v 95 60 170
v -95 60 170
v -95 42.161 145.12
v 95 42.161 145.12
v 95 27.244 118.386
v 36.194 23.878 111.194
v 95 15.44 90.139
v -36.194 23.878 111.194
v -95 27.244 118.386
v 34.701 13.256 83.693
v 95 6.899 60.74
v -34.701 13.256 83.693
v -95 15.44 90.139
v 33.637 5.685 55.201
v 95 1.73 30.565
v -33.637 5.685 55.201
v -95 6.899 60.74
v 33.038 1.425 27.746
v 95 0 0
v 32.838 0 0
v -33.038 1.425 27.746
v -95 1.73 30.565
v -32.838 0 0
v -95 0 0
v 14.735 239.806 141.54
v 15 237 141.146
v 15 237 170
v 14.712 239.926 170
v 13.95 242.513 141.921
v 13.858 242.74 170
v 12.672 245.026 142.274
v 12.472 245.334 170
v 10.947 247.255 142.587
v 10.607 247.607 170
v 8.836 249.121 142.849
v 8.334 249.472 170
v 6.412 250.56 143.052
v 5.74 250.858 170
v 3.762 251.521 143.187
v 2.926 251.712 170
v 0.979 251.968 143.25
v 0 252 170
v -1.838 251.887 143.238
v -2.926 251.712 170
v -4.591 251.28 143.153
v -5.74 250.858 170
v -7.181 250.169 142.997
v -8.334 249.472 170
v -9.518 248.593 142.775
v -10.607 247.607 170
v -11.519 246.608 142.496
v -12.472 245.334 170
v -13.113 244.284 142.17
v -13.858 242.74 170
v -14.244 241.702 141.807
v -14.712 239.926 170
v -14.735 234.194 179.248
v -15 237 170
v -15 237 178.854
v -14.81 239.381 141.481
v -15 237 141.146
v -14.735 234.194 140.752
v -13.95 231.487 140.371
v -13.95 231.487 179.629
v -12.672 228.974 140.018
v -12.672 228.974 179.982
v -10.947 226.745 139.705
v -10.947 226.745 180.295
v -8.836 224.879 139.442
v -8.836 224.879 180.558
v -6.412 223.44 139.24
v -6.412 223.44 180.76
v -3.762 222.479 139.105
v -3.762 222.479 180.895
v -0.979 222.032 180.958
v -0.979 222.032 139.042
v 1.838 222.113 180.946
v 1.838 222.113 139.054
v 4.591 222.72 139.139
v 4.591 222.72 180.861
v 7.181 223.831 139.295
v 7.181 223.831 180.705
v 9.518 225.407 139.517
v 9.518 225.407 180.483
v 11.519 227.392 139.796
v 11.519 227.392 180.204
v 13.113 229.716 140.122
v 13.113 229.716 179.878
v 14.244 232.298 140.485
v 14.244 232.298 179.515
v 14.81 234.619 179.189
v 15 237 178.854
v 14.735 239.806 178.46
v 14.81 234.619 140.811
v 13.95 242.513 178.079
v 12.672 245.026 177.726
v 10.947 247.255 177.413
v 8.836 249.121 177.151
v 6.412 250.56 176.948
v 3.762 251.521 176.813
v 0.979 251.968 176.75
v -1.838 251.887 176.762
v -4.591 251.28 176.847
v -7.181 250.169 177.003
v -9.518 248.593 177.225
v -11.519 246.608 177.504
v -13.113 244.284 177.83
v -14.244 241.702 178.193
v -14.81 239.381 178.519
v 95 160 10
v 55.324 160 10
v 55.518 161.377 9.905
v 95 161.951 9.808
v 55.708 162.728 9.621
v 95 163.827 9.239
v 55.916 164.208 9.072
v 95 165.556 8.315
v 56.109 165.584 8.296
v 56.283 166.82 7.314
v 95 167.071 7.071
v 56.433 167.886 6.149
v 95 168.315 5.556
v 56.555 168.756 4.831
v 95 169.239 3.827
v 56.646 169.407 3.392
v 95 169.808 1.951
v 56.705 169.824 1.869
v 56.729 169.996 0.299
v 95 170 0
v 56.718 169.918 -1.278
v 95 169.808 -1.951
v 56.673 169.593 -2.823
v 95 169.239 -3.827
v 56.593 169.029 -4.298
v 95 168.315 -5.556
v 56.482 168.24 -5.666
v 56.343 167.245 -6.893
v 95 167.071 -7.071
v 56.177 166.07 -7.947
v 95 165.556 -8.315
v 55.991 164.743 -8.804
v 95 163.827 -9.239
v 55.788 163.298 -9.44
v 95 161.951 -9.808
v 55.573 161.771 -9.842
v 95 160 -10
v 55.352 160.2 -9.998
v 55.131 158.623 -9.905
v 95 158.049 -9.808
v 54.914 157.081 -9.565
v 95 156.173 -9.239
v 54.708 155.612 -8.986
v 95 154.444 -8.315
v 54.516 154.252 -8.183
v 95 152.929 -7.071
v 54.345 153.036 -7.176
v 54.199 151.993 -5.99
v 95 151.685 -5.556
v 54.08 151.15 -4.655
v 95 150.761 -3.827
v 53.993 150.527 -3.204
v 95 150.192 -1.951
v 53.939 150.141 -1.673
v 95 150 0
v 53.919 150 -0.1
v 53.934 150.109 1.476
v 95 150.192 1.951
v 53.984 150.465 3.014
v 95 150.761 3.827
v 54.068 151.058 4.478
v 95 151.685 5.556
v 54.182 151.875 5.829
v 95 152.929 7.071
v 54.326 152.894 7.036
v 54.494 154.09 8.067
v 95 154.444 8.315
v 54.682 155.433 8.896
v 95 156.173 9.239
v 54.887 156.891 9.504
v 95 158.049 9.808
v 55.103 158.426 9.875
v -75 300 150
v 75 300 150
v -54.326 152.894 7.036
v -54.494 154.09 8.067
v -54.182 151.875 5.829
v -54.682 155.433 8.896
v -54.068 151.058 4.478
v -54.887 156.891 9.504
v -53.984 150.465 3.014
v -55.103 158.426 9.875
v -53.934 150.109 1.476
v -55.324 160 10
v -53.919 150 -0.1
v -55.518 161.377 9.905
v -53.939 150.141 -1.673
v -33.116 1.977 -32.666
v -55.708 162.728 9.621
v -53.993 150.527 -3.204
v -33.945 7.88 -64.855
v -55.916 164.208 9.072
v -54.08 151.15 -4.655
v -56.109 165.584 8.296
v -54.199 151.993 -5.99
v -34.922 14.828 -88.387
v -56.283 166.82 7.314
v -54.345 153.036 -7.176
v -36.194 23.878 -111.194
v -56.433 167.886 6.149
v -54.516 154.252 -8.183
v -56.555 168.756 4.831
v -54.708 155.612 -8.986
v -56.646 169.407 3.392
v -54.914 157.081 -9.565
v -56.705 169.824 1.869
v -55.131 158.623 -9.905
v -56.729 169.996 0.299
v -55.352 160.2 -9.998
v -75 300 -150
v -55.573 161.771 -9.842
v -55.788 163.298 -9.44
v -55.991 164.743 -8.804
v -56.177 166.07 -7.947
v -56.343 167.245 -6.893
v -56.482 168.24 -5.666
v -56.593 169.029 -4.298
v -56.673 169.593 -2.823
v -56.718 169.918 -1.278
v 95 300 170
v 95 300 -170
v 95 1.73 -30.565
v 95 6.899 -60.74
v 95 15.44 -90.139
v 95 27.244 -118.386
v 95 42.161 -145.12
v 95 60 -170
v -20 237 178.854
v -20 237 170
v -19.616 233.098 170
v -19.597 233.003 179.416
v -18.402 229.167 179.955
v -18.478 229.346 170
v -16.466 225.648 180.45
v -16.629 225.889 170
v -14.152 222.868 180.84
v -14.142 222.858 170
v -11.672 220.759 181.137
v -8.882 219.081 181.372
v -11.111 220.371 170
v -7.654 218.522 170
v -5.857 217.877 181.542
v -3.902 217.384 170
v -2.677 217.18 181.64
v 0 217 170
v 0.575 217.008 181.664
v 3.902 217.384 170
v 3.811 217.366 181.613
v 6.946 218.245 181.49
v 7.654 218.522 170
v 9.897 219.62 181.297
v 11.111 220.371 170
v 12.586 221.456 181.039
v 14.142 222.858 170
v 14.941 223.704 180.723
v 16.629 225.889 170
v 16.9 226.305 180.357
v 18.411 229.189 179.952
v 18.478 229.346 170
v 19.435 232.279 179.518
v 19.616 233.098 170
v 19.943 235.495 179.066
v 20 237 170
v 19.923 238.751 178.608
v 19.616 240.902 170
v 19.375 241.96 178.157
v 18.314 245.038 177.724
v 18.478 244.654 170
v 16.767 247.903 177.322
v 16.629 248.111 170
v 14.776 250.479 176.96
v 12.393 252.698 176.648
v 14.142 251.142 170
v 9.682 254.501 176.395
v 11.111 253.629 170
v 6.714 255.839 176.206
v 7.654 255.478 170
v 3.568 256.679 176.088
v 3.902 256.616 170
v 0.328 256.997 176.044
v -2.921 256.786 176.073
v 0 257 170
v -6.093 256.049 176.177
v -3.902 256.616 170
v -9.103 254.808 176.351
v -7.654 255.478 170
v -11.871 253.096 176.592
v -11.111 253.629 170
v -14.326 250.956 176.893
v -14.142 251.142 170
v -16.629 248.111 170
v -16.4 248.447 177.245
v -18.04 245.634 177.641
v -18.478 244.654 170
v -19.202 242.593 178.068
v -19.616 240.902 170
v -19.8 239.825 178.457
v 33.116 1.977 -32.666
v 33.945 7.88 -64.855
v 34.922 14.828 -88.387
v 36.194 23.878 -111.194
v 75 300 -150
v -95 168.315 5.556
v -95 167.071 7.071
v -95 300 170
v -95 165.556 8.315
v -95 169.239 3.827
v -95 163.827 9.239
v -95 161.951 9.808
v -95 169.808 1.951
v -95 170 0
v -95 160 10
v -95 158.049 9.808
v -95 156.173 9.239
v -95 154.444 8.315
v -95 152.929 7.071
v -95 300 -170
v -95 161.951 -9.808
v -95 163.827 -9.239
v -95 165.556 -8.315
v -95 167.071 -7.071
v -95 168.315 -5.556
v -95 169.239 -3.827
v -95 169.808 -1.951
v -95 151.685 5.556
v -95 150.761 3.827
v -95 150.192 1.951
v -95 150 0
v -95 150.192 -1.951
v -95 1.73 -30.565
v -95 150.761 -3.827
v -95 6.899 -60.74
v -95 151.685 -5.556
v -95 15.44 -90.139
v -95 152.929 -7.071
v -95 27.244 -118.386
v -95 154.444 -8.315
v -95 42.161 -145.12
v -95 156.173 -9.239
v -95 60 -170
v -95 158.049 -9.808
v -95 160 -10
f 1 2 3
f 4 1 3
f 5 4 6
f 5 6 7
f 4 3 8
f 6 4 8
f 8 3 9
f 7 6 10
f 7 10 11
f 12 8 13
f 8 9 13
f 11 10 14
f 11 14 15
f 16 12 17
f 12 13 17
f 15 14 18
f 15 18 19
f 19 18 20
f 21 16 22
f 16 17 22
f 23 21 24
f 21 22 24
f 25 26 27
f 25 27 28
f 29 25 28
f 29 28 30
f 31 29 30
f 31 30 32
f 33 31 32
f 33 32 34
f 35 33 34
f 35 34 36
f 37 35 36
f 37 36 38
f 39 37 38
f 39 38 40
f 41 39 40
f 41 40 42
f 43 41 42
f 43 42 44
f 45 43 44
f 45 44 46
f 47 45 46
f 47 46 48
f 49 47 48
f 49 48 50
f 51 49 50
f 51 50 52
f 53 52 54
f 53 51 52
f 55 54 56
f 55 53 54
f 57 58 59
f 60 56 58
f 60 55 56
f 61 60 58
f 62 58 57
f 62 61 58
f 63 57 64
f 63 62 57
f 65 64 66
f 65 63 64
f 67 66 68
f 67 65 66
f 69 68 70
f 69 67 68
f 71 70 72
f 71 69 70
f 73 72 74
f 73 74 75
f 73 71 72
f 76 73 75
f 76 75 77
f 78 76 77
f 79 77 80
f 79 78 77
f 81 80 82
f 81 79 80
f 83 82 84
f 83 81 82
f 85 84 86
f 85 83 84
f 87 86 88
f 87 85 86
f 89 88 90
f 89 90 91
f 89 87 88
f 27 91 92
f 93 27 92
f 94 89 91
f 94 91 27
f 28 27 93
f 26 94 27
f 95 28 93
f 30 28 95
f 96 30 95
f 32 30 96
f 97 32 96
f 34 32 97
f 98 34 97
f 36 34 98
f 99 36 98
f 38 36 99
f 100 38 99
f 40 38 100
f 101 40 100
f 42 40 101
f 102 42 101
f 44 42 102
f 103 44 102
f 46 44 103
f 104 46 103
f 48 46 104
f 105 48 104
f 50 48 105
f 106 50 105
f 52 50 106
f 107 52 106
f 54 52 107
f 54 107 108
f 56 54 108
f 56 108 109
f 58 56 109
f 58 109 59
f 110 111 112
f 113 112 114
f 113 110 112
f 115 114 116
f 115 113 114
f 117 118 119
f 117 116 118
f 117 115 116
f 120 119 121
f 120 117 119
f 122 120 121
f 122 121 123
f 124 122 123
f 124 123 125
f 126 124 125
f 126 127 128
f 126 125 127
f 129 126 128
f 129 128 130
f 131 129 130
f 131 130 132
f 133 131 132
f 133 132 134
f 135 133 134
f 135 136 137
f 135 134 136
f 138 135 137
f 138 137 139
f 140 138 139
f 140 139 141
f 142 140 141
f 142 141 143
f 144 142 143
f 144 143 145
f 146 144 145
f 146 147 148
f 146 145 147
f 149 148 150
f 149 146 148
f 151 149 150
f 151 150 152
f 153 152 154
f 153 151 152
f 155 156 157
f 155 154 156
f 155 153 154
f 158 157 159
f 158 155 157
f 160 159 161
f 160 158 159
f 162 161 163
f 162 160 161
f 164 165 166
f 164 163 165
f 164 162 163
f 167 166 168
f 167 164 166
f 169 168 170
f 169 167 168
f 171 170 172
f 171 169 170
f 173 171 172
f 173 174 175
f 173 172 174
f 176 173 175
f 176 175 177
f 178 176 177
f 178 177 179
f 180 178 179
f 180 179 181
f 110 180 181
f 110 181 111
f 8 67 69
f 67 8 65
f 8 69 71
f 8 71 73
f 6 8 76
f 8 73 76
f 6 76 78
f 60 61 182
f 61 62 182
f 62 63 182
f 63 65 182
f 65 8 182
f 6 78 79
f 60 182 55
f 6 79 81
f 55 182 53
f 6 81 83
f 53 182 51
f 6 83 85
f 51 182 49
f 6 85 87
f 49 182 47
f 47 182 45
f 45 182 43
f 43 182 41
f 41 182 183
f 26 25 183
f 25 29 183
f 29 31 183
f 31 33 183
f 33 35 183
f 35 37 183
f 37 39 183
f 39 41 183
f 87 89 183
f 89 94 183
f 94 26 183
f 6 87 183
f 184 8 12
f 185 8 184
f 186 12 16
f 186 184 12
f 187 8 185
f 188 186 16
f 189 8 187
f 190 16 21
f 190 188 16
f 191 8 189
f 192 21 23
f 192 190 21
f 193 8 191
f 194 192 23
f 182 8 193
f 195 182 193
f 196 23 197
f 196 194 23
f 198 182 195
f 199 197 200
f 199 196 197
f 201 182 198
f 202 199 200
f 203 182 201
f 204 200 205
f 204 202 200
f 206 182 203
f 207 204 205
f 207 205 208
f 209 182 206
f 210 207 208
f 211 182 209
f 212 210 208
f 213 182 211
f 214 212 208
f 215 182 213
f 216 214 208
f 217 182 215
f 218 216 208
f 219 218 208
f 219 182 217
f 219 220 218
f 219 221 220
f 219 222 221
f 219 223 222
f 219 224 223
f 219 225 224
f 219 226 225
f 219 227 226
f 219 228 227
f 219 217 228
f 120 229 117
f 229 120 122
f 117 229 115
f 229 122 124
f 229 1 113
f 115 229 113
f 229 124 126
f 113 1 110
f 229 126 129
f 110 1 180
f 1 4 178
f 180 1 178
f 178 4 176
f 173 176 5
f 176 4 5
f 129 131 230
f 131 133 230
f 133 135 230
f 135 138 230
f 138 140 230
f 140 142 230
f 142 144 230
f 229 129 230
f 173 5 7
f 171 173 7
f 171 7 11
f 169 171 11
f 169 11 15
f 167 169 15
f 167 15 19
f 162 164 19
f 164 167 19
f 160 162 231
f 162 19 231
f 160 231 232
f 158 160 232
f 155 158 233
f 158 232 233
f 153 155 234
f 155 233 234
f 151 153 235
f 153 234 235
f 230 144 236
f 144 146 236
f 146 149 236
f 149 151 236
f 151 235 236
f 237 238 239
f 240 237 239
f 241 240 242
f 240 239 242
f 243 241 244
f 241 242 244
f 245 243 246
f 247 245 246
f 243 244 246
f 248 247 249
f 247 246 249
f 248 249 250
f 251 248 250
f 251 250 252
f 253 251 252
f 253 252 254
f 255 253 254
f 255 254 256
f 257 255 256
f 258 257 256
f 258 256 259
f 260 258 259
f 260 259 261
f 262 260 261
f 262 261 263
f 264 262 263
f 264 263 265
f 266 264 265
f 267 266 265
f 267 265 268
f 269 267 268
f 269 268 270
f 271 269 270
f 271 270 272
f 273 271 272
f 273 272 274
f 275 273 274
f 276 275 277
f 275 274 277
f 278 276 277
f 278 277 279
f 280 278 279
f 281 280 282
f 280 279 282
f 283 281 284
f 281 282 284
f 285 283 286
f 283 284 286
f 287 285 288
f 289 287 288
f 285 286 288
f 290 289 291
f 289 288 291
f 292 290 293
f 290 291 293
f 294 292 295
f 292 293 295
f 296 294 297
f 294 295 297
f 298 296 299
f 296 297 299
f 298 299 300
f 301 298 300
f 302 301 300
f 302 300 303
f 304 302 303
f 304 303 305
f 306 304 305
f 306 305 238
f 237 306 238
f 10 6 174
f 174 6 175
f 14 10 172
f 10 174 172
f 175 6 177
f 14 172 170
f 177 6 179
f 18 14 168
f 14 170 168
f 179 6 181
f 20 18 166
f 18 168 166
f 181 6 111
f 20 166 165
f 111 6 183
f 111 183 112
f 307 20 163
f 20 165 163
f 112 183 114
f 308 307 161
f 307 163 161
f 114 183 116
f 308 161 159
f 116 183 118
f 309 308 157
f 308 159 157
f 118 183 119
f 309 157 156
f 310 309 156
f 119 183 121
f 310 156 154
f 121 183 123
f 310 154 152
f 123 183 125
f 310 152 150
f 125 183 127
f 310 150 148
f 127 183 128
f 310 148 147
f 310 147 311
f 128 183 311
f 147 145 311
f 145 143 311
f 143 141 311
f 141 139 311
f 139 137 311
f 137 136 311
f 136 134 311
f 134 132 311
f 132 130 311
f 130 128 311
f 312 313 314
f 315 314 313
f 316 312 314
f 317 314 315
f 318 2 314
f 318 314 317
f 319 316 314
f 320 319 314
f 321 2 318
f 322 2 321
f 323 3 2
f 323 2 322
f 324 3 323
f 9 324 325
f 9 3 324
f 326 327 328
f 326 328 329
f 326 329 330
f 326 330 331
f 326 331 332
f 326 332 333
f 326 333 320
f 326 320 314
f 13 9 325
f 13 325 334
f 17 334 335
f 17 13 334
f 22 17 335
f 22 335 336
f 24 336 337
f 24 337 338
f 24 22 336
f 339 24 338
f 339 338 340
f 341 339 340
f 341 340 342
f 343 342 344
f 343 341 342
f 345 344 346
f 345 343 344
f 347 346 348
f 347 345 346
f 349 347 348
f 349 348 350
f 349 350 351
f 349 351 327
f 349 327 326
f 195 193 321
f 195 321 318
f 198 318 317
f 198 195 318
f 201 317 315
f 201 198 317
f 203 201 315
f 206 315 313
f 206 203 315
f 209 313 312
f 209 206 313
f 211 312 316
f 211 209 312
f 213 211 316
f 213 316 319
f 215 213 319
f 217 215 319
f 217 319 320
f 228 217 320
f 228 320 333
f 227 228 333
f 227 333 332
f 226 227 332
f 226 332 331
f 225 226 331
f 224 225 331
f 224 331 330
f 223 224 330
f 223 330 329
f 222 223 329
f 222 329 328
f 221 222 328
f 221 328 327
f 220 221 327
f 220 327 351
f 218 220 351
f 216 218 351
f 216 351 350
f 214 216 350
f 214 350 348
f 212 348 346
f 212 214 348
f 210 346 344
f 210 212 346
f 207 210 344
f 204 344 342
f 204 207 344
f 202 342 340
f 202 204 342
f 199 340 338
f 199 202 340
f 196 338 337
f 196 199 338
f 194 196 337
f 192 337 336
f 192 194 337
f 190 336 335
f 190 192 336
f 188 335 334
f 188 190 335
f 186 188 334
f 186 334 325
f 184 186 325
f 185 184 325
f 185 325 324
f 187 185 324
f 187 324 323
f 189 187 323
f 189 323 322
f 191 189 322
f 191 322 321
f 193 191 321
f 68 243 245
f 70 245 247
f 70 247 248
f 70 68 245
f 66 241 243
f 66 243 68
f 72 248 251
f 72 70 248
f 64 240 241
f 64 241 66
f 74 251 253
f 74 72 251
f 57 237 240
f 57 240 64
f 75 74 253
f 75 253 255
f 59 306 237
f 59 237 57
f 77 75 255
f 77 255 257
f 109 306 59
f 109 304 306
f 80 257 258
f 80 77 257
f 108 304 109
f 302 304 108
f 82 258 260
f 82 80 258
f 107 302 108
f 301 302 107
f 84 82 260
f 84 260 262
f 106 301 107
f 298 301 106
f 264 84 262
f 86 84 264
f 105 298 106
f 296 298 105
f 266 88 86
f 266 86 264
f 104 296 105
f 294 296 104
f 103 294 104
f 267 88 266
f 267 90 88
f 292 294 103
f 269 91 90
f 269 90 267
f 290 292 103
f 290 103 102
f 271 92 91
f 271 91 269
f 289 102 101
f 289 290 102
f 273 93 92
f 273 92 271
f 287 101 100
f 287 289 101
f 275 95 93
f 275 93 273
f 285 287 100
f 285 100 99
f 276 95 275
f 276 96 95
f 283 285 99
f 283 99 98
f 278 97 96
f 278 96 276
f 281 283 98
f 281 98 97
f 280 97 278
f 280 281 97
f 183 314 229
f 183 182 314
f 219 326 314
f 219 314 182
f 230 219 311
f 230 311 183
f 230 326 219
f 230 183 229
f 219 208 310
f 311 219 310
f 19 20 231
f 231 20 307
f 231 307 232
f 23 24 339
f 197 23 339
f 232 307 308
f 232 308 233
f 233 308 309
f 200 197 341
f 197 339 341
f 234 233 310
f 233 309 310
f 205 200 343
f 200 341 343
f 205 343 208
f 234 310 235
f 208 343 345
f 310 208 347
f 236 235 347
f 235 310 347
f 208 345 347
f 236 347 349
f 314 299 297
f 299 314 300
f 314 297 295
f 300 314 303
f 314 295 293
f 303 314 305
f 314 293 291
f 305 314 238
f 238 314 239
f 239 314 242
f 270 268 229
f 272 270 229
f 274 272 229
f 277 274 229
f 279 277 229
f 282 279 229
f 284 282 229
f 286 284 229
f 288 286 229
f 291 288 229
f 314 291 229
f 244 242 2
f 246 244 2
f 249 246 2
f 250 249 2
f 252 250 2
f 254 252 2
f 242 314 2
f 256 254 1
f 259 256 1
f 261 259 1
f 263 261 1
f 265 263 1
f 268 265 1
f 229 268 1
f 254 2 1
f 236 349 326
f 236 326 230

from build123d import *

# Parameters (mm, degrees)
SKETCH1_W                    = 190
SKETCH1_H                    = 340
BOSS_EXTRUDE1_DEPTH          = 300
SKETCH2_R                    = 20
SKETCH2_R_2                  = 15
BOSS_EXTRUDE2_DEPTH          = 57
CUT_EXTRUDE1_START           = -190
SKETCH5_R                    = 10
CUT_EXTRUDE1_DEPTH           = 612.460555687
CUT_EXTRUDE2_DEPTH           = 422.460555687
CUT_EXTRUDE6_START           = -236
CUT_EXTRUDE6_DEPTH           = 236
SKETCH10_OUTSIDE_W           = 383.134
SKETCH10_OUTSIDE_H           = 590.134
SKETCH10_OUTSIDE_W_2         = 190
SKETCH10_OUTSIDE_H_2         = 340
CUT_EXTRUDE7_DEPTH           = 301
CUT_EXTRUDE7_DRAFT           = -8
SKETCH10_OUTSIDE_W_3         = 150
SKETCH10_OUTSIDE_H_3         = 300
CUT_EXTRUDE7_PROFILE_2_DEPTH = 301
CUT_EXTRUDE7_PROFILE_2_DRAFT = -8


with BuildPart() as part:
    # Sketch1 → Boss-Extrude1 (new body)
    with BuildSketch(Plane(origin=(0, 0, 0), x_dir=(1, 0, 0), z_dir=(0, 1, 0))):
        Rectangle(SKETCH1_W, SKETCH1_H)
    extrude(amount=BOSS_EXTRUDE1_DEPTH)

    # Sketch2 → Boss-Extrude2 (add)
    with BuildSketch(Plane.XY.offset(170)):
        with Locations(Location((0, 237, 0), (0, 0, 180))):
            Circle(SKETCH2_R)
        with Locations(Location((0, 237, 0), (0, 0, 180))):
            Circle(SKETCH2_R_2, mode=Mode.SUBTRACT)
    extrude(amount=BOSS_EXTRUDE2_DEPTH)

    # Sketch5 → Cut-Extrude1 (cut, through all)
    with BuildSketch(Plane.ZY.offset(95).offset(CUT_EXTRUDE1_START)):
        with Locations((0, 160)):
            Circle(SKETCH5_R)
    extrude(amount=CUT_EXTRUDE1_DEPTH, mode=Mode.SUBTRACT)

    # Sketch9 → Cut-Extrude2 (cut, through all)
    with BuildSketch(Plane.ZY.offset(95)):
        with BuildLine():
            ThreePointArc((0, 0), (-90.138848958, 15.439927953), (-170, 60))
            Line((-170, 60), (-170, 0))
            Line((-170, 0), (0, 0))
        make_face()
        with BuildLine():
            ThreePointArc((170, 60), (90.138848958, 15.439927953), (0, 0))
            Line((0, 0), (170, 0))
            Line((170, 0), (170, 60))
        make_face()
    extrude(amount=-CUT_EXTRUDE2_DEPTH, mode=Mode.SUBTRACT)

    # Sketch2<3> → Cut-Extrude6 (cut)
    with BuildSketch(Plane.XY.offset(170).offset(CUT_EXTRUDE6_START)):
        with BuildLine():
            ThreePointArc((-15, 237), (0, 222), (15, 237))
            Line((15, 237), (-15, 237))
        make_face()
        with BuildLine():
            Line((-15, 237), (15, 237))
            ThreePointArc((15, 237), (0, 252), (-15, 237))
        make_face()
    extrude(amount=CUT_EXTRUDE6_DEPTH, mode=Mode.SUBTRACT)


with BuildPart() as cut_extrude7_tool:
    # Sketch10 outside → Cut-Extrude7 (with draft: the straight prism first)
    with BuildSketch(Plane(origin=(0, 300, 0), x_dir=(1, 0, 0), z_dir=(0, 1, 0))):
        with Locations((0, -28.5)):
            Rectangle(SKETCH10_OUTSIDE_W, SKETCH10_OUTSIDE_H)
        Rectangle(SKETCH10_OUTSIDE_W_2, SKETCH10_OUTSIDE_H_2, mode=Mode.SUBTRACT)
    extrude(amount=-CUT_EXTRUDE7_DEPTH)
    # Cut-Extrude7: the draft: its side faces are tilted about the plane it starts from
    cut_extrude7_sides = [cut_extrude7_tool.faces().sort_by_distance(p)[0] for p in [
        (0, 149.5, 323.567),
        (191.567, 149.5, 28.5),
        (0, 149.5, -266.567),
        (-191.567, 149.5, 28.5),
        (0, 149.5, -170),
        (95, 149.5, 0),
        (0, 149.5, 170),
        (-95, 149.5, 0),
    ]]
    draft(cut_extrude7_sides, Plane(origin=(0, 300, 0), x_dir=(1, 0, 0), z_dir=(0, 1, 0)), CUT_EXTRUDE7_DRAFT)


with BuildPart() as part_1:
    add(part.part)

    # Cut-Extrude7: cut by cut_extrude7_tool
    add(cut_extrude7_tool.part, mode=Mode.SUBTRACT)


with BuildPart() as cut_extrude7_profile_2_tool:
    # Sketch10 outside → Cut-Extrude7 profile 2 (with draft: the straight prism first)
    with BuildSketch(Plane(origin=(0, 300, 0), x_dir=(1, 0, 0), z_dir=(0, 1, 0))):
        Rectangle(SKETCH10_OUTSIDE_W_3, SKETCH10_OUTSIDE_H_3)
    extrude(amount=-CUT_EXTRUDE7_PROFILE_2_DEPTH)
    # Cut-Extrude7 profile 2: the draft: its side faces are tilted about the plane it starts from
    cut_extrude7_profile_2_sides = [cut_extrude7_profile_2_tool.faces().sort_by_distance(p)[0] for p in [
        (-75, 149.5, 0),
        (0, 149.5, 150),
        (75, 149.5, 0),
        (0, 149.5, -150),
    ]]
    draft(cut_extrude7_profile_2_sides, Plane(origin=(0, 300, 0), x_dir=(1, 0, 0), z_dir=(0, 1, 0)), CUT_EXTRUDE7_PROFILE_2_DRAFT)


with BuildPart() as part_2:
    add(part_1.part)

    # Cut-Extrude7 profile 2: cut by cut_extrude7_profile_2_tool
    add(cut_extrude7_profile_2_tool.part, mode=Mode.SUBTRACT)


solid = part_2.part
